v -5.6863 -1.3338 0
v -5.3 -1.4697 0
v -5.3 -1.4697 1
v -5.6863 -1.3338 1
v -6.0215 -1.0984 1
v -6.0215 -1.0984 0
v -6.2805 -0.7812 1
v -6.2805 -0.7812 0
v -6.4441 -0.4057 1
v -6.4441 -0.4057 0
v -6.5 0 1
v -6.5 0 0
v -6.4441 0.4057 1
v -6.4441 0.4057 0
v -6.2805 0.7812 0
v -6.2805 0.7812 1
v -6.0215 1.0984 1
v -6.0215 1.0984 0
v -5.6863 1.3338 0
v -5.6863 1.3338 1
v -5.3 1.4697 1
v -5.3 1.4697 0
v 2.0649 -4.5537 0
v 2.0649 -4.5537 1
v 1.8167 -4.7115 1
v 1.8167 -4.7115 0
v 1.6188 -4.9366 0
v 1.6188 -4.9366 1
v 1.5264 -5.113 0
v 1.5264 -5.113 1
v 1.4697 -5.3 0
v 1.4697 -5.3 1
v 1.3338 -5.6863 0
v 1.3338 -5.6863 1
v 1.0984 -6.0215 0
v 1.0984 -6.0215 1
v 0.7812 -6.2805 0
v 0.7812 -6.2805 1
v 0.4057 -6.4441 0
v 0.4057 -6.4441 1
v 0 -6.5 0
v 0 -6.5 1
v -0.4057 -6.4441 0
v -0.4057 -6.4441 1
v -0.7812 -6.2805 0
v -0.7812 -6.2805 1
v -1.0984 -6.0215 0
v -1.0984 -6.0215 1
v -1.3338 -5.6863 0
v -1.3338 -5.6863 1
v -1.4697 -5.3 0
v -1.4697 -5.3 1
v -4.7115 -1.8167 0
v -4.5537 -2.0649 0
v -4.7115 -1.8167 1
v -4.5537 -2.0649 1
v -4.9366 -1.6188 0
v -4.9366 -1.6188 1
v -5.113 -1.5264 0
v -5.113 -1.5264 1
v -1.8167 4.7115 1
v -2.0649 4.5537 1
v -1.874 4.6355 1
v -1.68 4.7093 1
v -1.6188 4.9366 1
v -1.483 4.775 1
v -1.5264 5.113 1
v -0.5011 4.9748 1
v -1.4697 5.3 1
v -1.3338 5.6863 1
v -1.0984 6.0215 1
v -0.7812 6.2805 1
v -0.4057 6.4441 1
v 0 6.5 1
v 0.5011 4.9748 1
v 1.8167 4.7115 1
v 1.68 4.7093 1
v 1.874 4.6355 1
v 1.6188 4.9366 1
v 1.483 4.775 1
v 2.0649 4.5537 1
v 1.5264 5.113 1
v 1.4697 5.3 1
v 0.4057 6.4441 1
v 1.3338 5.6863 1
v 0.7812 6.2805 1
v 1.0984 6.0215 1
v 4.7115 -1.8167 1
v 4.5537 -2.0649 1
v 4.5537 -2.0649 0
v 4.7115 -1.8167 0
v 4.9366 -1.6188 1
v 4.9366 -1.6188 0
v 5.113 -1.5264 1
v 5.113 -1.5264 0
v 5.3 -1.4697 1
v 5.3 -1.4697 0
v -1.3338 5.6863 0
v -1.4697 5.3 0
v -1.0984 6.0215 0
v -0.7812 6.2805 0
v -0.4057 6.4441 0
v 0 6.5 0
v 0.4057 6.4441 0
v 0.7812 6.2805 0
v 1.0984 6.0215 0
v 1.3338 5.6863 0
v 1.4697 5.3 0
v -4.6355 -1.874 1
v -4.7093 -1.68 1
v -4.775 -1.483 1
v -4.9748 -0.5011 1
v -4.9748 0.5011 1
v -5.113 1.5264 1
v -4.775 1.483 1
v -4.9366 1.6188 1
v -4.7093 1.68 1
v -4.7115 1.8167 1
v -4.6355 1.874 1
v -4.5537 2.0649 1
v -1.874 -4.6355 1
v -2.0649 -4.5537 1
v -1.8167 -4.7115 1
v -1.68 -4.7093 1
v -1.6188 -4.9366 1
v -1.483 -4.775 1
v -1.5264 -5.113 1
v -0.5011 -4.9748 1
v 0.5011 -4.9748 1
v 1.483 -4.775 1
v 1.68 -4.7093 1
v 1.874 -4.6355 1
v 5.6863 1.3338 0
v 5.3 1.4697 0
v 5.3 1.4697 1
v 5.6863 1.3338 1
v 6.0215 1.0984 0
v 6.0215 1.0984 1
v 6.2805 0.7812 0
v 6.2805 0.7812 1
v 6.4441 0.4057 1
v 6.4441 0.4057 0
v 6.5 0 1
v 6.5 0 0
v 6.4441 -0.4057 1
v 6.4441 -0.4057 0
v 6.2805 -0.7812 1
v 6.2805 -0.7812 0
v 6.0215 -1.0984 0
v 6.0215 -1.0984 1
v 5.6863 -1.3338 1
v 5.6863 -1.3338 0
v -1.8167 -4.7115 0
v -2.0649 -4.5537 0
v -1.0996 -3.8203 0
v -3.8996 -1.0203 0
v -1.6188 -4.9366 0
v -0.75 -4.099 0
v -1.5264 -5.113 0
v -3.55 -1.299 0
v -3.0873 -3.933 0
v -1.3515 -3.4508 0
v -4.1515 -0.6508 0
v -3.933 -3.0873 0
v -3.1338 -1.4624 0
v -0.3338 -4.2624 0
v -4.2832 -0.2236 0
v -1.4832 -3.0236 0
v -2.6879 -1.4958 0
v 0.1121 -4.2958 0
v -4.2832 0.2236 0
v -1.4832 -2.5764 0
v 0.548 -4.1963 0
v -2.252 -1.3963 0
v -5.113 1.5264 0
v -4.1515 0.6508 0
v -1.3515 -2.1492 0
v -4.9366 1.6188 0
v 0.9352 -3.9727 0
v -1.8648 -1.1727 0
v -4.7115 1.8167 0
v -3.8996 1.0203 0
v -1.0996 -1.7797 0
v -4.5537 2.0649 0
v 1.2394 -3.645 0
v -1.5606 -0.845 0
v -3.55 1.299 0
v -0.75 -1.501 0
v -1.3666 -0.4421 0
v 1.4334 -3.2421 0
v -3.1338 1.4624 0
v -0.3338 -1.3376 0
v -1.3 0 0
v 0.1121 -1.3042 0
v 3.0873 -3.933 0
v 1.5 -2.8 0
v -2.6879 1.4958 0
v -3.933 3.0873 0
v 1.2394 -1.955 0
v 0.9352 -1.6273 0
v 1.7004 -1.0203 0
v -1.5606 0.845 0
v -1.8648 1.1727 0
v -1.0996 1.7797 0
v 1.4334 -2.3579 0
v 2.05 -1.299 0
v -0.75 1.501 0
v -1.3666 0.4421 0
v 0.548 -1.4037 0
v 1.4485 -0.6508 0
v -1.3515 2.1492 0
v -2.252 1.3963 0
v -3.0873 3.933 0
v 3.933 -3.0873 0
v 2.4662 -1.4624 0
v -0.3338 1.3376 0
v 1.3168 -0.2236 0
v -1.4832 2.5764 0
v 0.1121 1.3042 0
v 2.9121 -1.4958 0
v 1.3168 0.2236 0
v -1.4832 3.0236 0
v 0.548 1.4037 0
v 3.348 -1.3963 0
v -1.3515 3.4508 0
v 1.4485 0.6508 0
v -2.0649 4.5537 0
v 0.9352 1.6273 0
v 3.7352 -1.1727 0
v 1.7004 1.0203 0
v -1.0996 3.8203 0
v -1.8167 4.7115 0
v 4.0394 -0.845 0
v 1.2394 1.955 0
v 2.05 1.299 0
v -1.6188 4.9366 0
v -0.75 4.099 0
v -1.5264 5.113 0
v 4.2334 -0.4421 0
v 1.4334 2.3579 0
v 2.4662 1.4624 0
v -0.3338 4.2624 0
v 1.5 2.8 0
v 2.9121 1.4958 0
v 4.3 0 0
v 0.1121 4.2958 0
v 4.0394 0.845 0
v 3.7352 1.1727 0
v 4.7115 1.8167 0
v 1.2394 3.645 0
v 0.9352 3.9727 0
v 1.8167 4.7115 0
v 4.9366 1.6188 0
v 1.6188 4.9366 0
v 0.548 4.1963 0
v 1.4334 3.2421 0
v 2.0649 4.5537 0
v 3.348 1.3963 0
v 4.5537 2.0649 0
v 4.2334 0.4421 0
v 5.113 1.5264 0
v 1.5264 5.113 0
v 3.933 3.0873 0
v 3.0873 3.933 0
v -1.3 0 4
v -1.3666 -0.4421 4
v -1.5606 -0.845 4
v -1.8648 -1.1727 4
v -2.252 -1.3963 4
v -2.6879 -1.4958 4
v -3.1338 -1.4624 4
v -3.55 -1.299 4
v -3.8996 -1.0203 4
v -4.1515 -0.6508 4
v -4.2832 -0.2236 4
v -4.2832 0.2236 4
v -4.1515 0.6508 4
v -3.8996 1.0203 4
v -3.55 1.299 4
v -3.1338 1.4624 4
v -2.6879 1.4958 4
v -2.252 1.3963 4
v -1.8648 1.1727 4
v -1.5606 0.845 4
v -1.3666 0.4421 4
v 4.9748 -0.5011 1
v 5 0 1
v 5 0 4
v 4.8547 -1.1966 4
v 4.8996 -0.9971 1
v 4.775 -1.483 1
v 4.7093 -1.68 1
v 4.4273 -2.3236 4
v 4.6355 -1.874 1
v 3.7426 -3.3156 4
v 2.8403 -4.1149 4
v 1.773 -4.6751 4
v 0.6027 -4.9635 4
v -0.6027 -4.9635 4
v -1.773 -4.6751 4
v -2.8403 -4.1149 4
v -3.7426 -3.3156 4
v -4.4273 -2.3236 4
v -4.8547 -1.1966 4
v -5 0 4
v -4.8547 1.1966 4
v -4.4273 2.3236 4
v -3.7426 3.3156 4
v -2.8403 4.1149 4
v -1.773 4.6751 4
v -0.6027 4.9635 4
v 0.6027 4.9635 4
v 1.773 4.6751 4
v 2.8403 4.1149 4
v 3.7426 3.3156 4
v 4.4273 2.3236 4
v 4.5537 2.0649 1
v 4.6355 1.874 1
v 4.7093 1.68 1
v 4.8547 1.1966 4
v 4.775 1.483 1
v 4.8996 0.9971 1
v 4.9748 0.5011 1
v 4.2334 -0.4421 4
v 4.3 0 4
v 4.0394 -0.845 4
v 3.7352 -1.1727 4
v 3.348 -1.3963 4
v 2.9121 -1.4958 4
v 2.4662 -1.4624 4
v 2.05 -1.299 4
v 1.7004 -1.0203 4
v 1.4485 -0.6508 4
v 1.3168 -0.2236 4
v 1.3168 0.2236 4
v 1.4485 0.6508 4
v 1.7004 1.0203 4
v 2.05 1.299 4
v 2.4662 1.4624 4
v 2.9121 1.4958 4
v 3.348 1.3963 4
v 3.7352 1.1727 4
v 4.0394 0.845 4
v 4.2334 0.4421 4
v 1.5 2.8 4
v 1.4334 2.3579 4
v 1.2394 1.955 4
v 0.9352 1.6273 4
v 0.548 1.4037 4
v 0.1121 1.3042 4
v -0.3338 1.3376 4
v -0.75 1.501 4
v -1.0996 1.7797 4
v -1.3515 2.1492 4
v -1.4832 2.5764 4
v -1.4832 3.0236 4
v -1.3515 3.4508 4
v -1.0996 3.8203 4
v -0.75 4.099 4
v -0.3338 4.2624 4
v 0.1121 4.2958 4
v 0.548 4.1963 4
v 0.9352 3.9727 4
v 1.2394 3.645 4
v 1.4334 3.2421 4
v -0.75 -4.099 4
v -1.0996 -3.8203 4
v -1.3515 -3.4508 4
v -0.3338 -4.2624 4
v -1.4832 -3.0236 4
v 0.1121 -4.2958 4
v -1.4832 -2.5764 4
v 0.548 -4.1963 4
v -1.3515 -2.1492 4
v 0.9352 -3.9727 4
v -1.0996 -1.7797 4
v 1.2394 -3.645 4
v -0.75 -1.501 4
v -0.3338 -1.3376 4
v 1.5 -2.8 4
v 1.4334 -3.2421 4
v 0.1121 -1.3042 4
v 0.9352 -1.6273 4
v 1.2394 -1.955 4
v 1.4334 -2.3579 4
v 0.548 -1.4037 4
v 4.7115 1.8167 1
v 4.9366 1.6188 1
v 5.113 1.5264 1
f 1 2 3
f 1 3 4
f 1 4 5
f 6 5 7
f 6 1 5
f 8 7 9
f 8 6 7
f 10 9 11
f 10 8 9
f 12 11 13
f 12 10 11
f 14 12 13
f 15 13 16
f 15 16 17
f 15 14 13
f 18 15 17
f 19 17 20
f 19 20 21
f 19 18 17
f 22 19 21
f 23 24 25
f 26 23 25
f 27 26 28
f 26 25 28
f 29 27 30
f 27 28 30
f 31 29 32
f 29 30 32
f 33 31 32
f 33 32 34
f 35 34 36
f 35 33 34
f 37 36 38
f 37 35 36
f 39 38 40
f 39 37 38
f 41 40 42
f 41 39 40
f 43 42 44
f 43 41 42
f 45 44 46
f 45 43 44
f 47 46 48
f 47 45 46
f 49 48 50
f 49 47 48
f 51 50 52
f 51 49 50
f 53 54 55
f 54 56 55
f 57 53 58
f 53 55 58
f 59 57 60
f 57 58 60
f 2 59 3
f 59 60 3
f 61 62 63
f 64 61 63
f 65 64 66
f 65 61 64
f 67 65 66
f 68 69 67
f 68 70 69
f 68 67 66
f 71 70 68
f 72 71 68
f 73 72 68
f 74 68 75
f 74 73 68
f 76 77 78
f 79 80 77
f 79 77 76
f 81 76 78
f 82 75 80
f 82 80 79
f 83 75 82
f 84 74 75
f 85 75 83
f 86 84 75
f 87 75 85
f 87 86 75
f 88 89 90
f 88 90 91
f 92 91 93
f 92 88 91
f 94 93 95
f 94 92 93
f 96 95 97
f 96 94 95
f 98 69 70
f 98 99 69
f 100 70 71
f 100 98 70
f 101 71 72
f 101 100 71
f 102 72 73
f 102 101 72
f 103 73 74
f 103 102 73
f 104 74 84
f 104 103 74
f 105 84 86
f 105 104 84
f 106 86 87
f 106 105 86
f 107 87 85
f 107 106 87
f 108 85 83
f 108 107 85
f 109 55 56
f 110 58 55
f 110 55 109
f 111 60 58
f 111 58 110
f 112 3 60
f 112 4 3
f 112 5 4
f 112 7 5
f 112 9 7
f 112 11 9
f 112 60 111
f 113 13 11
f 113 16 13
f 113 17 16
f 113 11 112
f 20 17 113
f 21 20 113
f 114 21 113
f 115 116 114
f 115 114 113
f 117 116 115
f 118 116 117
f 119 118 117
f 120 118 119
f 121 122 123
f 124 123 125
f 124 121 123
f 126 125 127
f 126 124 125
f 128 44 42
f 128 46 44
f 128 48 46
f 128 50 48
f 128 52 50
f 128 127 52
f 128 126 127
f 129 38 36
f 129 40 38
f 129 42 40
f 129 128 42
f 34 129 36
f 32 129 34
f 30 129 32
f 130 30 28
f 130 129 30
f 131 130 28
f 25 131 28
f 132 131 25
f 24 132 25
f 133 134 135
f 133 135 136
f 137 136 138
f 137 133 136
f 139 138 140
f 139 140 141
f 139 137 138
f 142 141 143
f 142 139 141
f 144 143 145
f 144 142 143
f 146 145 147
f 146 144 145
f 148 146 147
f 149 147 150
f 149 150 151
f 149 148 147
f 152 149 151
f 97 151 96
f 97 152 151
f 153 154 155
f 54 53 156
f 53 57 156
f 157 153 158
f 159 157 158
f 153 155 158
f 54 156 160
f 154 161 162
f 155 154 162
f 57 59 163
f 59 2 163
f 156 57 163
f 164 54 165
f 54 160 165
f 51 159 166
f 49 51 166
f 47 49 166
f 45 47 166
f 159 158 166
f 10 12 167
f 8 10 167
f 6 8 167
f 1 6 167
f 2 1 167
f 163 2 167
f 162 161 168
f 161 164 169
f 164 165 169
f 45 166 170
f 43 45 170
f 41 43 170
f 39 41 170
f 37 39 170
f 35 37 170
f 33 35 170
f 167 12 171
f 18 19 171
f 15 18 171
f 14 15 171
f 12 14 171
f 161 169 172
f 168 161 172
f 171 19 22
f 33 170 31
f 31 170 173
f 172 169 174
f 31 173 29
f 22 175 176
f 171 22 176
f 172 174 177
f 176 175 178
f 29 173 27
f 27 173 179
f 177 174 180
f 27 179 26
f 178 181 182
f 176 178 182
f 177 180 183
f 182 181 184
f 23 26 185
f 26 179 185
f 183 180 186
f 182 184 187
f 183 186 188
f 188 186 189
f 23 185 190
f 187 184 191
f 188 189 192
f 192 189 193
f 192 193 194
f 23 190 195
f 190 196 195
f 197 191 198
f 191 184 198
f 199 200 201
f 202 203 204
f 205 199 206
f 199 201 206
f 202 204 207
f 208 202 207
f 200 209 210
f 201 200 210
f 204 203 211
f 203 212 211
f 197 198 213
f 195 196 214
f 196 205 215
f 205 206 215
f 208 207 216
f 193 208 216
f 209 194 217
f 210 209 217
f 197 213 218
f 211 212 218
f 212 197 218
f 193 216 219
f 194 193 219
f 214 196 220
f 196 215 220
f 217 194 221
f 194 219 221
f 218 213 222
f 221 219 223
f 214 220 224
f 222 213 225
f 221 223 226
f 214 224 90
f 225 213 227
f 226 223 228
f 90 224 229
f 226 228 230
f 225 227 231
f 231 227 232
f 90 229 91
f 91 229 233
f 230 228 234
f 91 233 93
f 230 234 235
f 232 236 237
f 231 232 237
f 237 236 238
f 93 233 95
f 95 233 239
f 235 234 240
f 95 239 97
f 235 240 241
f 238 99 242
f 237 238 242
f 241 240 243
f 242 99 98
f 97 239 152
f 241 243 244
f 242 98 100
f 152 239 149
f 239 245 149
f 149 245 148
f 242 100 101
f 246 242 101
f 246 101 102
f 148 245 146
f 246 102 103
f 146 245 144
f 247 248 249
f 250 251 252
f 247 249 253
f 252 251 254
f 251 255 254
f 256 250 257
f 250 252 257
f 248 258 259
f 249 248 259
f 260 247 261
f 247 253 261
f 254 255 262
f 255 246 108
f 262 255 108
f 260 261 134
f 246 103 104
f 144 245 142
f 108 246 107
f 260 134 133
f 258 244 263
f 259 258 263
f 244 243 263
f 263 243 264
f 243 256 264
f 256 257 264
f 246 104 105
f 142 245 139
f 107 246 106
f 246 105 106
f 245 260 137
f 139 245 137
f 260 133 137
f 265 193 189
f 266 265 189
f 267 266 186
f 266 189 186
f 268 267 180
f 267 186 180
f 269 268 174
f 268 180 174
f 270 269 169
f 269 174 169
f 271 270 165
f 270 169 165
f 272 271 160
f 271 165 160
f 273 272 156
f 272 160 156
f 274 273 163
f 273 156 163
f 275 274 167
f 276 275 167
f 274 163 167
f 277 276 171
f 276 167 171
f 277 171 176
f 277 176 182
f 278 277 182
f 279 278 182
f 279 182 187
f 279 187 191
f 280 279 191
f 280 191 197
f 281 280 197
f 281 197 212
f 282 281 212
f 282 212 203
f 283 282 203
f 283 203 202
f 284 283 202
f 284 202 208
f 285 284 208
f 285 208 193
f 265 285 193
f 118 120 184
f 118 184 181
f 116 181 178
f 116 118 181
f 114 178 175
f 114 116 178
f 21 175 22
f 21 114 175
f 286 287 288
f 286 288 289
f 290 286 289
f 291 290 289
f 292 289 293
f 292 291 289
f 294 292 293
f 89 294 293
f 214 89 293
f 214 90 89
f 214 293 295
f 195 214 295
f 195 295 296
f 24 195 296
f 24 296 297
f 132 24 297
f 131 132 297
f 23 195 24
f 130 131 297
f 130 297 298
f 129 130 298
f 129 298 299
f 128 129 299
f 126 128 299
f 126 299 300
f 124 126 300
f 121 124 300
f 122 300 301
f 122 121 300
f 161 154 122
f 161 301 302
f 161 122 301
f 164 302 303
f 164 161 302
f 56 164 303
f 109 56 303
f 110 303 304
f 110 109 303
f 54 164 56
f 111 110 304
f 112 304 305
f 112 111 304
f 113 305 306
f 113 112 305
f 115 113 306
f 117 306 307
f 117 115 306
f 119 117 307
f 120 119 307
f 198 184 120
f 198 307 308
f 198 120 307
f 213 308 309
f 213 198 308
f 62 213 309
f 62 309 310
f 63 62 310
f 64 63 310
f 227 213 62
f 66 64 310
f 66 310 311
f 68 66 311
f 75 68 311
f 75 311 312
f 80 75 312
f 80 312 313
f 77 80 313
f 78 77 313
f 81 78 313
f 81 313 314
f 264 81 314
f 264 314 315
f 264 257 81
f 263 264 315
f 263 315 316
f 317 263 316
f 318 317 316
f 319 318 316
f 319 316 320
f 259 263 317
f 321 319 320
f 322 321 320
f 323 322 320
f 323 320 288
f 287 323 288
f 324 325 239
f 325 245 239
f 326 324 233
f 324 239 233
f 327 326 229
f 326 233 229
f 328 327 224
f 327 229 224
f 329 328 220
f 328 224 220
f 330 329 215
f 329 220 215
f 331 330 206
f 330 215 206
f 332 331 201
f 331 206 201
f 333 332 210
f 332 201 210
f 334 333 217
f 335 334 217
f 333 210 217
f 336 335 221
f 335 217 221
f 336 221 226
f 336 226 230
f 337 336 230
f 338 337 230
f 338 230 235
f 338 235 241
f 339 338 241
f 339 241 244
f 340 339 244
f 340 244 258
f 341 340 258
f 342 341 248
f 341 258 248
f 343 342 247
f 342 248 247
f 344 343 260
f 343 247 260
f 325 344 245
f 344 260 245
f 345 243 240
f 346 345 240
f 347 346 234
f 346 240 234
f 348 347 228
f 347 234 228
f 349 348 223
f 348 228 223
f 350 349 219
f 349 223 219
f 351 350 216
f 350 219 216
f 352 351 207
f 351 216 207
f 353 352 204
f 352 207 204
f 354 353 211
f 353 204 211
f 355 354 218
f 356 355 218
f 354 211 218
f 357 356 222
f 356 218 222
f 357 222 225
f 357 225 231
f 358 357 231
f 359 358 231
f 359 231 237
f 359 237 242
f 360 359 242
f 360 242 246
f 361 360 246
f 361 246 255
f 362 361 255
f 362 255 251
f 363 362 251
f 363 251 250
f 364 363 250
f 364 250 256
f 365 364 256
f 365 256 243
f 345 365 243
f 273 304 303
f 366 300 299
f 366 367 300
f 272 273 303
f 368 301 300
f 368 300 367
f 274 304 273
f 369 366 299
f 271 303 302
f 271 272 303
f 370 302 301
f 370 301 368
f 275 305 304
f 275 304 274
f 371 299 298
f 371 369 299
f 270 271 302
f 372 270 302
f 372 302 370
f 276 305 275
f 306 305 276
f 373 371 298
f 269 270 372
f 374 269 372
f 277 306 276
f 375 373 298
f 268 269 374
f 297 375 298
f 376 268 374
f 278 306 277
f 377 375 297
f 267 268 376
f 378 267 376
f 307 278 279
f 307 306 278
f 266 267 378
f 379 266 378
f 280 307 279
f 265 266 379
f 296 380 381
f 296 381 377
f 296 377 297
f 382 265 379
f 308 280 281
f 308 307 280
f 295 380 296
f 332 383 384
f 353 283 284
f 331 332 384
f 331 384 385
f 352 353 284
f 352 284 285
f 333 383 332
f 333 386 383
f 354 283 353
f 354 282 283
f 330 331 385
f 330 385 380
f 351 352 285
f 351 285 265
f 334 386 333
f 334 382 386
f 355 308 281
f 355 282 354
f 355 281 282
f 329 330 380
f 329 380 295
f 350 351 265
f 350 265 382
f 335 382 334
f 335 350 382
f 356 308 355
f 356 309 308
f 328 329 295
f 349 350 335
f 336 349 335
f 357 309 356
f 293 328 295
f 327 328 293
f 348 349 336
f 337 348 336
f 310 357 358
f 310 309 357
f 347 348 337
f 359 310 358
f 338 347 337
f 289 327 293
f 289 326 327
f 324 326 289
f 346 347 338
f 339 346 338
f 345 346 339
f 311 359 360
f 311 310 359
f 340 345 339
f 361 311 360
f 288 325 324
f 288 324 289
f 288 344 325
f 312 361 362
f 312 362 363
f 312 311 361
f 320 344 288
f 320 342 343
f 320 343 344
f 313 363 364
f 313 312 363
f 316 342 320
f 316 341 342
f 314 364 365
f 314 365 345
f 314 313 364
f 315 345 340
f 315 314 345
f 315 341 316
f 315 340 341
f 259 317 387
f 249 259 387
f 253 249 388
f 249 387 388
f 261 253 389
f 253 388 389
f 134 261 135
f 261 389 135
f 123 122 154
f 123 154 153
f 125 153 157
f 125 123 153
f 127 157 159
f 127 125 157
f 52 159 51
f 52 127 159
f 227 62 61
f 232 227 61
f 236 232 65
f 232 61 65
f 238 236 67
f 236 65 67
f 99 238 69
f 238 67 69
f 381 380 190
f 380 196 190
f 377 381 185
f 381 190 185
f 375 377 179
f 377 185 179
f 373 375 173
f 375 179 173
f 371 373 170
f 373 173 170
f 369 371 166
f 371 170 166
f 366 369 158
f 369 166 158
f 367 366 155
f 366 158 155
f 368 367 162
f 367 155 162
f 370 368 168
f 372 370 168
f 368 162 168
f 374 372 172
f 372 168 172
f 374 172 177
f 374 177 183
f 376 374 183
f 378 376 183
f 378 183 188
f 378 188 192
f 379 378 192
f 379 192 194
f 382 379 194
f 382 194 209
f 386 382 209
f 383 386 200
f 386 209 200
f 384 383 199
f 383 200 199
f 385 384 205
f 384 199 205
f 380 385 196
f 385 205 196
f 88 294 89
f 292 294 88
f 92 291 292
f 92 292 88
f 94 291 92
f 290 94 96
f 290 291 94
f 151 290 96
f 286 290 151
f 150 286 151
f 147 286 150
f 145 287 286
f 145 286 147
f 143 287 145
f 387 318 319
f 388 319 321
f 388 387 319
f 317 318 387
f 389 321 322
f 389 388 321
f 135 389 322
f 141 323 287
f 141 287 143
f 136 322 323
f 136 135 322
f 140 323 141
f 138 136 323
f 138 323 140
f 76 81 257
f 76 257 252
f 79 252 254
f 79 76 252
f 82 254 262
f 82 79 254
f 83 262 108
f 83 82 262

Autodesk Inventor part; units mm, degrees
ref_plane "YZ Plane" through (0, 0, 0) normal (1, 0, 0) x (0, 1, 0)
ref_plane "XZ Plane" through (0, 0, 0) normal (0, 1, 0) x (-1, 0, 0)
ref_plane "XY Plane" through (0, 0, 0) normal (0, 0, 1) x (1, 0, 0)
sketch "スケッチ1" plane through (0, 0, 0) normal (0, 0, 1) x (1, 0, 0)
  circle A0 centre (2.8, 0) radius 2.8
  line L0 (2.8, 0) -> (0, 0)
  circle A1 centre (0, 2.8) radius 2.8
  circle A2 centre (-2.8, 0) radius 2.8
  circle A3 centre (0, -2.8) radius 2.8
  circle A4 centre (2.8, 0) radius 1.5
  circle A5 centre (0, 2.8) radius 1.5
  circle A6 centre (-2.8, 0) radius 1.5
  circle A7 centre (0, -2.8) radius 1.5
  circle A8 centre (0, 0) radius 5
  circle A9 centre (0, 5) radius 1.5
  circle A10 centre (-5, 0) radius 1.5
  circle A11 centre (0, -5) radius 1.5
  circle A12 centre (5, 0) radius 1.5
  point P0 (-1.483, -4.775)
  point P1 (1.483, -4.775)
  point P2 (-4.775, -1.483)
  point P3 (-4.775, 1.483)
  point P4 (4.775, 1.483)
  point P5 (4.775, -1.483)
  point P6 (-1.483, 4.775)
  point P7 (1.483, 4.775)
  dimension "d12" = 10
  dimension "d1" = 5.6
  dimension "d4" = 360
  dimension "d7" = 3
  dimension "d10" = 360
  dimension "d15" = 3
  dimension "d18" = 360
extrude "押し出し1" add sketch "スケッチ1" along normal blind 4 contours A8 A12 A4 A1 A0 | A0 A1 A8 | A8 A12 A4 | A8 A3 A0 | A0 A3 A4 A12 A8 | A1 A4 A0 A5 | A0 A5 A9 A8 A1 | A3 A8 A11 A7 A0 | A0 A7 A3 A4 | A9 A5 A8 | A8 A11 A7 | A0 A2 A5 | A4 L0 A1 | A9 A5 A2 A1 A8 | A7 A2 A0 | A3 L0 A4 | A8 A3 A2 A7 A11 | A3 A6 A1 | A1 A6 A2 A5 | A2 A7 A3 A6 | A1 A2 A8 | A8 A2 A3 | A1 A6 A10 A8 A2 | A2 A8 A10 A6 A3 | A10 A6 A8
extrude "押し出し2" add sketch "スケッチ1" along normal blind 1 contours A0 A12 A8 | A0 A12 | A9 A8 A1 | A1 A9 | A11 A3 | A3 A11 A8 | A10 A8 A2 | A2 A10 picked at (5.3837, -0.1736) picked at (-0.1045, 5.1773) picked at (-0.1045, -5.1773) picked at (-5.1773, 0.1045)
fillet "フィレット1" radius 1.05 8 edges at (4.775, 1.483, 0.5) (4.775, -1.483, 0.5) (1.483, 4.775, 0.5) (-1.483, 4.775, 0.5) (-1.483, -4.775, 0.5) (1.483, -4.775, 0.5) (-4.775, 1.483, 0.5) (-4.775, -1.483, 0.5)
properties part number "カムL4F" material "アセタール樹脂、白"
